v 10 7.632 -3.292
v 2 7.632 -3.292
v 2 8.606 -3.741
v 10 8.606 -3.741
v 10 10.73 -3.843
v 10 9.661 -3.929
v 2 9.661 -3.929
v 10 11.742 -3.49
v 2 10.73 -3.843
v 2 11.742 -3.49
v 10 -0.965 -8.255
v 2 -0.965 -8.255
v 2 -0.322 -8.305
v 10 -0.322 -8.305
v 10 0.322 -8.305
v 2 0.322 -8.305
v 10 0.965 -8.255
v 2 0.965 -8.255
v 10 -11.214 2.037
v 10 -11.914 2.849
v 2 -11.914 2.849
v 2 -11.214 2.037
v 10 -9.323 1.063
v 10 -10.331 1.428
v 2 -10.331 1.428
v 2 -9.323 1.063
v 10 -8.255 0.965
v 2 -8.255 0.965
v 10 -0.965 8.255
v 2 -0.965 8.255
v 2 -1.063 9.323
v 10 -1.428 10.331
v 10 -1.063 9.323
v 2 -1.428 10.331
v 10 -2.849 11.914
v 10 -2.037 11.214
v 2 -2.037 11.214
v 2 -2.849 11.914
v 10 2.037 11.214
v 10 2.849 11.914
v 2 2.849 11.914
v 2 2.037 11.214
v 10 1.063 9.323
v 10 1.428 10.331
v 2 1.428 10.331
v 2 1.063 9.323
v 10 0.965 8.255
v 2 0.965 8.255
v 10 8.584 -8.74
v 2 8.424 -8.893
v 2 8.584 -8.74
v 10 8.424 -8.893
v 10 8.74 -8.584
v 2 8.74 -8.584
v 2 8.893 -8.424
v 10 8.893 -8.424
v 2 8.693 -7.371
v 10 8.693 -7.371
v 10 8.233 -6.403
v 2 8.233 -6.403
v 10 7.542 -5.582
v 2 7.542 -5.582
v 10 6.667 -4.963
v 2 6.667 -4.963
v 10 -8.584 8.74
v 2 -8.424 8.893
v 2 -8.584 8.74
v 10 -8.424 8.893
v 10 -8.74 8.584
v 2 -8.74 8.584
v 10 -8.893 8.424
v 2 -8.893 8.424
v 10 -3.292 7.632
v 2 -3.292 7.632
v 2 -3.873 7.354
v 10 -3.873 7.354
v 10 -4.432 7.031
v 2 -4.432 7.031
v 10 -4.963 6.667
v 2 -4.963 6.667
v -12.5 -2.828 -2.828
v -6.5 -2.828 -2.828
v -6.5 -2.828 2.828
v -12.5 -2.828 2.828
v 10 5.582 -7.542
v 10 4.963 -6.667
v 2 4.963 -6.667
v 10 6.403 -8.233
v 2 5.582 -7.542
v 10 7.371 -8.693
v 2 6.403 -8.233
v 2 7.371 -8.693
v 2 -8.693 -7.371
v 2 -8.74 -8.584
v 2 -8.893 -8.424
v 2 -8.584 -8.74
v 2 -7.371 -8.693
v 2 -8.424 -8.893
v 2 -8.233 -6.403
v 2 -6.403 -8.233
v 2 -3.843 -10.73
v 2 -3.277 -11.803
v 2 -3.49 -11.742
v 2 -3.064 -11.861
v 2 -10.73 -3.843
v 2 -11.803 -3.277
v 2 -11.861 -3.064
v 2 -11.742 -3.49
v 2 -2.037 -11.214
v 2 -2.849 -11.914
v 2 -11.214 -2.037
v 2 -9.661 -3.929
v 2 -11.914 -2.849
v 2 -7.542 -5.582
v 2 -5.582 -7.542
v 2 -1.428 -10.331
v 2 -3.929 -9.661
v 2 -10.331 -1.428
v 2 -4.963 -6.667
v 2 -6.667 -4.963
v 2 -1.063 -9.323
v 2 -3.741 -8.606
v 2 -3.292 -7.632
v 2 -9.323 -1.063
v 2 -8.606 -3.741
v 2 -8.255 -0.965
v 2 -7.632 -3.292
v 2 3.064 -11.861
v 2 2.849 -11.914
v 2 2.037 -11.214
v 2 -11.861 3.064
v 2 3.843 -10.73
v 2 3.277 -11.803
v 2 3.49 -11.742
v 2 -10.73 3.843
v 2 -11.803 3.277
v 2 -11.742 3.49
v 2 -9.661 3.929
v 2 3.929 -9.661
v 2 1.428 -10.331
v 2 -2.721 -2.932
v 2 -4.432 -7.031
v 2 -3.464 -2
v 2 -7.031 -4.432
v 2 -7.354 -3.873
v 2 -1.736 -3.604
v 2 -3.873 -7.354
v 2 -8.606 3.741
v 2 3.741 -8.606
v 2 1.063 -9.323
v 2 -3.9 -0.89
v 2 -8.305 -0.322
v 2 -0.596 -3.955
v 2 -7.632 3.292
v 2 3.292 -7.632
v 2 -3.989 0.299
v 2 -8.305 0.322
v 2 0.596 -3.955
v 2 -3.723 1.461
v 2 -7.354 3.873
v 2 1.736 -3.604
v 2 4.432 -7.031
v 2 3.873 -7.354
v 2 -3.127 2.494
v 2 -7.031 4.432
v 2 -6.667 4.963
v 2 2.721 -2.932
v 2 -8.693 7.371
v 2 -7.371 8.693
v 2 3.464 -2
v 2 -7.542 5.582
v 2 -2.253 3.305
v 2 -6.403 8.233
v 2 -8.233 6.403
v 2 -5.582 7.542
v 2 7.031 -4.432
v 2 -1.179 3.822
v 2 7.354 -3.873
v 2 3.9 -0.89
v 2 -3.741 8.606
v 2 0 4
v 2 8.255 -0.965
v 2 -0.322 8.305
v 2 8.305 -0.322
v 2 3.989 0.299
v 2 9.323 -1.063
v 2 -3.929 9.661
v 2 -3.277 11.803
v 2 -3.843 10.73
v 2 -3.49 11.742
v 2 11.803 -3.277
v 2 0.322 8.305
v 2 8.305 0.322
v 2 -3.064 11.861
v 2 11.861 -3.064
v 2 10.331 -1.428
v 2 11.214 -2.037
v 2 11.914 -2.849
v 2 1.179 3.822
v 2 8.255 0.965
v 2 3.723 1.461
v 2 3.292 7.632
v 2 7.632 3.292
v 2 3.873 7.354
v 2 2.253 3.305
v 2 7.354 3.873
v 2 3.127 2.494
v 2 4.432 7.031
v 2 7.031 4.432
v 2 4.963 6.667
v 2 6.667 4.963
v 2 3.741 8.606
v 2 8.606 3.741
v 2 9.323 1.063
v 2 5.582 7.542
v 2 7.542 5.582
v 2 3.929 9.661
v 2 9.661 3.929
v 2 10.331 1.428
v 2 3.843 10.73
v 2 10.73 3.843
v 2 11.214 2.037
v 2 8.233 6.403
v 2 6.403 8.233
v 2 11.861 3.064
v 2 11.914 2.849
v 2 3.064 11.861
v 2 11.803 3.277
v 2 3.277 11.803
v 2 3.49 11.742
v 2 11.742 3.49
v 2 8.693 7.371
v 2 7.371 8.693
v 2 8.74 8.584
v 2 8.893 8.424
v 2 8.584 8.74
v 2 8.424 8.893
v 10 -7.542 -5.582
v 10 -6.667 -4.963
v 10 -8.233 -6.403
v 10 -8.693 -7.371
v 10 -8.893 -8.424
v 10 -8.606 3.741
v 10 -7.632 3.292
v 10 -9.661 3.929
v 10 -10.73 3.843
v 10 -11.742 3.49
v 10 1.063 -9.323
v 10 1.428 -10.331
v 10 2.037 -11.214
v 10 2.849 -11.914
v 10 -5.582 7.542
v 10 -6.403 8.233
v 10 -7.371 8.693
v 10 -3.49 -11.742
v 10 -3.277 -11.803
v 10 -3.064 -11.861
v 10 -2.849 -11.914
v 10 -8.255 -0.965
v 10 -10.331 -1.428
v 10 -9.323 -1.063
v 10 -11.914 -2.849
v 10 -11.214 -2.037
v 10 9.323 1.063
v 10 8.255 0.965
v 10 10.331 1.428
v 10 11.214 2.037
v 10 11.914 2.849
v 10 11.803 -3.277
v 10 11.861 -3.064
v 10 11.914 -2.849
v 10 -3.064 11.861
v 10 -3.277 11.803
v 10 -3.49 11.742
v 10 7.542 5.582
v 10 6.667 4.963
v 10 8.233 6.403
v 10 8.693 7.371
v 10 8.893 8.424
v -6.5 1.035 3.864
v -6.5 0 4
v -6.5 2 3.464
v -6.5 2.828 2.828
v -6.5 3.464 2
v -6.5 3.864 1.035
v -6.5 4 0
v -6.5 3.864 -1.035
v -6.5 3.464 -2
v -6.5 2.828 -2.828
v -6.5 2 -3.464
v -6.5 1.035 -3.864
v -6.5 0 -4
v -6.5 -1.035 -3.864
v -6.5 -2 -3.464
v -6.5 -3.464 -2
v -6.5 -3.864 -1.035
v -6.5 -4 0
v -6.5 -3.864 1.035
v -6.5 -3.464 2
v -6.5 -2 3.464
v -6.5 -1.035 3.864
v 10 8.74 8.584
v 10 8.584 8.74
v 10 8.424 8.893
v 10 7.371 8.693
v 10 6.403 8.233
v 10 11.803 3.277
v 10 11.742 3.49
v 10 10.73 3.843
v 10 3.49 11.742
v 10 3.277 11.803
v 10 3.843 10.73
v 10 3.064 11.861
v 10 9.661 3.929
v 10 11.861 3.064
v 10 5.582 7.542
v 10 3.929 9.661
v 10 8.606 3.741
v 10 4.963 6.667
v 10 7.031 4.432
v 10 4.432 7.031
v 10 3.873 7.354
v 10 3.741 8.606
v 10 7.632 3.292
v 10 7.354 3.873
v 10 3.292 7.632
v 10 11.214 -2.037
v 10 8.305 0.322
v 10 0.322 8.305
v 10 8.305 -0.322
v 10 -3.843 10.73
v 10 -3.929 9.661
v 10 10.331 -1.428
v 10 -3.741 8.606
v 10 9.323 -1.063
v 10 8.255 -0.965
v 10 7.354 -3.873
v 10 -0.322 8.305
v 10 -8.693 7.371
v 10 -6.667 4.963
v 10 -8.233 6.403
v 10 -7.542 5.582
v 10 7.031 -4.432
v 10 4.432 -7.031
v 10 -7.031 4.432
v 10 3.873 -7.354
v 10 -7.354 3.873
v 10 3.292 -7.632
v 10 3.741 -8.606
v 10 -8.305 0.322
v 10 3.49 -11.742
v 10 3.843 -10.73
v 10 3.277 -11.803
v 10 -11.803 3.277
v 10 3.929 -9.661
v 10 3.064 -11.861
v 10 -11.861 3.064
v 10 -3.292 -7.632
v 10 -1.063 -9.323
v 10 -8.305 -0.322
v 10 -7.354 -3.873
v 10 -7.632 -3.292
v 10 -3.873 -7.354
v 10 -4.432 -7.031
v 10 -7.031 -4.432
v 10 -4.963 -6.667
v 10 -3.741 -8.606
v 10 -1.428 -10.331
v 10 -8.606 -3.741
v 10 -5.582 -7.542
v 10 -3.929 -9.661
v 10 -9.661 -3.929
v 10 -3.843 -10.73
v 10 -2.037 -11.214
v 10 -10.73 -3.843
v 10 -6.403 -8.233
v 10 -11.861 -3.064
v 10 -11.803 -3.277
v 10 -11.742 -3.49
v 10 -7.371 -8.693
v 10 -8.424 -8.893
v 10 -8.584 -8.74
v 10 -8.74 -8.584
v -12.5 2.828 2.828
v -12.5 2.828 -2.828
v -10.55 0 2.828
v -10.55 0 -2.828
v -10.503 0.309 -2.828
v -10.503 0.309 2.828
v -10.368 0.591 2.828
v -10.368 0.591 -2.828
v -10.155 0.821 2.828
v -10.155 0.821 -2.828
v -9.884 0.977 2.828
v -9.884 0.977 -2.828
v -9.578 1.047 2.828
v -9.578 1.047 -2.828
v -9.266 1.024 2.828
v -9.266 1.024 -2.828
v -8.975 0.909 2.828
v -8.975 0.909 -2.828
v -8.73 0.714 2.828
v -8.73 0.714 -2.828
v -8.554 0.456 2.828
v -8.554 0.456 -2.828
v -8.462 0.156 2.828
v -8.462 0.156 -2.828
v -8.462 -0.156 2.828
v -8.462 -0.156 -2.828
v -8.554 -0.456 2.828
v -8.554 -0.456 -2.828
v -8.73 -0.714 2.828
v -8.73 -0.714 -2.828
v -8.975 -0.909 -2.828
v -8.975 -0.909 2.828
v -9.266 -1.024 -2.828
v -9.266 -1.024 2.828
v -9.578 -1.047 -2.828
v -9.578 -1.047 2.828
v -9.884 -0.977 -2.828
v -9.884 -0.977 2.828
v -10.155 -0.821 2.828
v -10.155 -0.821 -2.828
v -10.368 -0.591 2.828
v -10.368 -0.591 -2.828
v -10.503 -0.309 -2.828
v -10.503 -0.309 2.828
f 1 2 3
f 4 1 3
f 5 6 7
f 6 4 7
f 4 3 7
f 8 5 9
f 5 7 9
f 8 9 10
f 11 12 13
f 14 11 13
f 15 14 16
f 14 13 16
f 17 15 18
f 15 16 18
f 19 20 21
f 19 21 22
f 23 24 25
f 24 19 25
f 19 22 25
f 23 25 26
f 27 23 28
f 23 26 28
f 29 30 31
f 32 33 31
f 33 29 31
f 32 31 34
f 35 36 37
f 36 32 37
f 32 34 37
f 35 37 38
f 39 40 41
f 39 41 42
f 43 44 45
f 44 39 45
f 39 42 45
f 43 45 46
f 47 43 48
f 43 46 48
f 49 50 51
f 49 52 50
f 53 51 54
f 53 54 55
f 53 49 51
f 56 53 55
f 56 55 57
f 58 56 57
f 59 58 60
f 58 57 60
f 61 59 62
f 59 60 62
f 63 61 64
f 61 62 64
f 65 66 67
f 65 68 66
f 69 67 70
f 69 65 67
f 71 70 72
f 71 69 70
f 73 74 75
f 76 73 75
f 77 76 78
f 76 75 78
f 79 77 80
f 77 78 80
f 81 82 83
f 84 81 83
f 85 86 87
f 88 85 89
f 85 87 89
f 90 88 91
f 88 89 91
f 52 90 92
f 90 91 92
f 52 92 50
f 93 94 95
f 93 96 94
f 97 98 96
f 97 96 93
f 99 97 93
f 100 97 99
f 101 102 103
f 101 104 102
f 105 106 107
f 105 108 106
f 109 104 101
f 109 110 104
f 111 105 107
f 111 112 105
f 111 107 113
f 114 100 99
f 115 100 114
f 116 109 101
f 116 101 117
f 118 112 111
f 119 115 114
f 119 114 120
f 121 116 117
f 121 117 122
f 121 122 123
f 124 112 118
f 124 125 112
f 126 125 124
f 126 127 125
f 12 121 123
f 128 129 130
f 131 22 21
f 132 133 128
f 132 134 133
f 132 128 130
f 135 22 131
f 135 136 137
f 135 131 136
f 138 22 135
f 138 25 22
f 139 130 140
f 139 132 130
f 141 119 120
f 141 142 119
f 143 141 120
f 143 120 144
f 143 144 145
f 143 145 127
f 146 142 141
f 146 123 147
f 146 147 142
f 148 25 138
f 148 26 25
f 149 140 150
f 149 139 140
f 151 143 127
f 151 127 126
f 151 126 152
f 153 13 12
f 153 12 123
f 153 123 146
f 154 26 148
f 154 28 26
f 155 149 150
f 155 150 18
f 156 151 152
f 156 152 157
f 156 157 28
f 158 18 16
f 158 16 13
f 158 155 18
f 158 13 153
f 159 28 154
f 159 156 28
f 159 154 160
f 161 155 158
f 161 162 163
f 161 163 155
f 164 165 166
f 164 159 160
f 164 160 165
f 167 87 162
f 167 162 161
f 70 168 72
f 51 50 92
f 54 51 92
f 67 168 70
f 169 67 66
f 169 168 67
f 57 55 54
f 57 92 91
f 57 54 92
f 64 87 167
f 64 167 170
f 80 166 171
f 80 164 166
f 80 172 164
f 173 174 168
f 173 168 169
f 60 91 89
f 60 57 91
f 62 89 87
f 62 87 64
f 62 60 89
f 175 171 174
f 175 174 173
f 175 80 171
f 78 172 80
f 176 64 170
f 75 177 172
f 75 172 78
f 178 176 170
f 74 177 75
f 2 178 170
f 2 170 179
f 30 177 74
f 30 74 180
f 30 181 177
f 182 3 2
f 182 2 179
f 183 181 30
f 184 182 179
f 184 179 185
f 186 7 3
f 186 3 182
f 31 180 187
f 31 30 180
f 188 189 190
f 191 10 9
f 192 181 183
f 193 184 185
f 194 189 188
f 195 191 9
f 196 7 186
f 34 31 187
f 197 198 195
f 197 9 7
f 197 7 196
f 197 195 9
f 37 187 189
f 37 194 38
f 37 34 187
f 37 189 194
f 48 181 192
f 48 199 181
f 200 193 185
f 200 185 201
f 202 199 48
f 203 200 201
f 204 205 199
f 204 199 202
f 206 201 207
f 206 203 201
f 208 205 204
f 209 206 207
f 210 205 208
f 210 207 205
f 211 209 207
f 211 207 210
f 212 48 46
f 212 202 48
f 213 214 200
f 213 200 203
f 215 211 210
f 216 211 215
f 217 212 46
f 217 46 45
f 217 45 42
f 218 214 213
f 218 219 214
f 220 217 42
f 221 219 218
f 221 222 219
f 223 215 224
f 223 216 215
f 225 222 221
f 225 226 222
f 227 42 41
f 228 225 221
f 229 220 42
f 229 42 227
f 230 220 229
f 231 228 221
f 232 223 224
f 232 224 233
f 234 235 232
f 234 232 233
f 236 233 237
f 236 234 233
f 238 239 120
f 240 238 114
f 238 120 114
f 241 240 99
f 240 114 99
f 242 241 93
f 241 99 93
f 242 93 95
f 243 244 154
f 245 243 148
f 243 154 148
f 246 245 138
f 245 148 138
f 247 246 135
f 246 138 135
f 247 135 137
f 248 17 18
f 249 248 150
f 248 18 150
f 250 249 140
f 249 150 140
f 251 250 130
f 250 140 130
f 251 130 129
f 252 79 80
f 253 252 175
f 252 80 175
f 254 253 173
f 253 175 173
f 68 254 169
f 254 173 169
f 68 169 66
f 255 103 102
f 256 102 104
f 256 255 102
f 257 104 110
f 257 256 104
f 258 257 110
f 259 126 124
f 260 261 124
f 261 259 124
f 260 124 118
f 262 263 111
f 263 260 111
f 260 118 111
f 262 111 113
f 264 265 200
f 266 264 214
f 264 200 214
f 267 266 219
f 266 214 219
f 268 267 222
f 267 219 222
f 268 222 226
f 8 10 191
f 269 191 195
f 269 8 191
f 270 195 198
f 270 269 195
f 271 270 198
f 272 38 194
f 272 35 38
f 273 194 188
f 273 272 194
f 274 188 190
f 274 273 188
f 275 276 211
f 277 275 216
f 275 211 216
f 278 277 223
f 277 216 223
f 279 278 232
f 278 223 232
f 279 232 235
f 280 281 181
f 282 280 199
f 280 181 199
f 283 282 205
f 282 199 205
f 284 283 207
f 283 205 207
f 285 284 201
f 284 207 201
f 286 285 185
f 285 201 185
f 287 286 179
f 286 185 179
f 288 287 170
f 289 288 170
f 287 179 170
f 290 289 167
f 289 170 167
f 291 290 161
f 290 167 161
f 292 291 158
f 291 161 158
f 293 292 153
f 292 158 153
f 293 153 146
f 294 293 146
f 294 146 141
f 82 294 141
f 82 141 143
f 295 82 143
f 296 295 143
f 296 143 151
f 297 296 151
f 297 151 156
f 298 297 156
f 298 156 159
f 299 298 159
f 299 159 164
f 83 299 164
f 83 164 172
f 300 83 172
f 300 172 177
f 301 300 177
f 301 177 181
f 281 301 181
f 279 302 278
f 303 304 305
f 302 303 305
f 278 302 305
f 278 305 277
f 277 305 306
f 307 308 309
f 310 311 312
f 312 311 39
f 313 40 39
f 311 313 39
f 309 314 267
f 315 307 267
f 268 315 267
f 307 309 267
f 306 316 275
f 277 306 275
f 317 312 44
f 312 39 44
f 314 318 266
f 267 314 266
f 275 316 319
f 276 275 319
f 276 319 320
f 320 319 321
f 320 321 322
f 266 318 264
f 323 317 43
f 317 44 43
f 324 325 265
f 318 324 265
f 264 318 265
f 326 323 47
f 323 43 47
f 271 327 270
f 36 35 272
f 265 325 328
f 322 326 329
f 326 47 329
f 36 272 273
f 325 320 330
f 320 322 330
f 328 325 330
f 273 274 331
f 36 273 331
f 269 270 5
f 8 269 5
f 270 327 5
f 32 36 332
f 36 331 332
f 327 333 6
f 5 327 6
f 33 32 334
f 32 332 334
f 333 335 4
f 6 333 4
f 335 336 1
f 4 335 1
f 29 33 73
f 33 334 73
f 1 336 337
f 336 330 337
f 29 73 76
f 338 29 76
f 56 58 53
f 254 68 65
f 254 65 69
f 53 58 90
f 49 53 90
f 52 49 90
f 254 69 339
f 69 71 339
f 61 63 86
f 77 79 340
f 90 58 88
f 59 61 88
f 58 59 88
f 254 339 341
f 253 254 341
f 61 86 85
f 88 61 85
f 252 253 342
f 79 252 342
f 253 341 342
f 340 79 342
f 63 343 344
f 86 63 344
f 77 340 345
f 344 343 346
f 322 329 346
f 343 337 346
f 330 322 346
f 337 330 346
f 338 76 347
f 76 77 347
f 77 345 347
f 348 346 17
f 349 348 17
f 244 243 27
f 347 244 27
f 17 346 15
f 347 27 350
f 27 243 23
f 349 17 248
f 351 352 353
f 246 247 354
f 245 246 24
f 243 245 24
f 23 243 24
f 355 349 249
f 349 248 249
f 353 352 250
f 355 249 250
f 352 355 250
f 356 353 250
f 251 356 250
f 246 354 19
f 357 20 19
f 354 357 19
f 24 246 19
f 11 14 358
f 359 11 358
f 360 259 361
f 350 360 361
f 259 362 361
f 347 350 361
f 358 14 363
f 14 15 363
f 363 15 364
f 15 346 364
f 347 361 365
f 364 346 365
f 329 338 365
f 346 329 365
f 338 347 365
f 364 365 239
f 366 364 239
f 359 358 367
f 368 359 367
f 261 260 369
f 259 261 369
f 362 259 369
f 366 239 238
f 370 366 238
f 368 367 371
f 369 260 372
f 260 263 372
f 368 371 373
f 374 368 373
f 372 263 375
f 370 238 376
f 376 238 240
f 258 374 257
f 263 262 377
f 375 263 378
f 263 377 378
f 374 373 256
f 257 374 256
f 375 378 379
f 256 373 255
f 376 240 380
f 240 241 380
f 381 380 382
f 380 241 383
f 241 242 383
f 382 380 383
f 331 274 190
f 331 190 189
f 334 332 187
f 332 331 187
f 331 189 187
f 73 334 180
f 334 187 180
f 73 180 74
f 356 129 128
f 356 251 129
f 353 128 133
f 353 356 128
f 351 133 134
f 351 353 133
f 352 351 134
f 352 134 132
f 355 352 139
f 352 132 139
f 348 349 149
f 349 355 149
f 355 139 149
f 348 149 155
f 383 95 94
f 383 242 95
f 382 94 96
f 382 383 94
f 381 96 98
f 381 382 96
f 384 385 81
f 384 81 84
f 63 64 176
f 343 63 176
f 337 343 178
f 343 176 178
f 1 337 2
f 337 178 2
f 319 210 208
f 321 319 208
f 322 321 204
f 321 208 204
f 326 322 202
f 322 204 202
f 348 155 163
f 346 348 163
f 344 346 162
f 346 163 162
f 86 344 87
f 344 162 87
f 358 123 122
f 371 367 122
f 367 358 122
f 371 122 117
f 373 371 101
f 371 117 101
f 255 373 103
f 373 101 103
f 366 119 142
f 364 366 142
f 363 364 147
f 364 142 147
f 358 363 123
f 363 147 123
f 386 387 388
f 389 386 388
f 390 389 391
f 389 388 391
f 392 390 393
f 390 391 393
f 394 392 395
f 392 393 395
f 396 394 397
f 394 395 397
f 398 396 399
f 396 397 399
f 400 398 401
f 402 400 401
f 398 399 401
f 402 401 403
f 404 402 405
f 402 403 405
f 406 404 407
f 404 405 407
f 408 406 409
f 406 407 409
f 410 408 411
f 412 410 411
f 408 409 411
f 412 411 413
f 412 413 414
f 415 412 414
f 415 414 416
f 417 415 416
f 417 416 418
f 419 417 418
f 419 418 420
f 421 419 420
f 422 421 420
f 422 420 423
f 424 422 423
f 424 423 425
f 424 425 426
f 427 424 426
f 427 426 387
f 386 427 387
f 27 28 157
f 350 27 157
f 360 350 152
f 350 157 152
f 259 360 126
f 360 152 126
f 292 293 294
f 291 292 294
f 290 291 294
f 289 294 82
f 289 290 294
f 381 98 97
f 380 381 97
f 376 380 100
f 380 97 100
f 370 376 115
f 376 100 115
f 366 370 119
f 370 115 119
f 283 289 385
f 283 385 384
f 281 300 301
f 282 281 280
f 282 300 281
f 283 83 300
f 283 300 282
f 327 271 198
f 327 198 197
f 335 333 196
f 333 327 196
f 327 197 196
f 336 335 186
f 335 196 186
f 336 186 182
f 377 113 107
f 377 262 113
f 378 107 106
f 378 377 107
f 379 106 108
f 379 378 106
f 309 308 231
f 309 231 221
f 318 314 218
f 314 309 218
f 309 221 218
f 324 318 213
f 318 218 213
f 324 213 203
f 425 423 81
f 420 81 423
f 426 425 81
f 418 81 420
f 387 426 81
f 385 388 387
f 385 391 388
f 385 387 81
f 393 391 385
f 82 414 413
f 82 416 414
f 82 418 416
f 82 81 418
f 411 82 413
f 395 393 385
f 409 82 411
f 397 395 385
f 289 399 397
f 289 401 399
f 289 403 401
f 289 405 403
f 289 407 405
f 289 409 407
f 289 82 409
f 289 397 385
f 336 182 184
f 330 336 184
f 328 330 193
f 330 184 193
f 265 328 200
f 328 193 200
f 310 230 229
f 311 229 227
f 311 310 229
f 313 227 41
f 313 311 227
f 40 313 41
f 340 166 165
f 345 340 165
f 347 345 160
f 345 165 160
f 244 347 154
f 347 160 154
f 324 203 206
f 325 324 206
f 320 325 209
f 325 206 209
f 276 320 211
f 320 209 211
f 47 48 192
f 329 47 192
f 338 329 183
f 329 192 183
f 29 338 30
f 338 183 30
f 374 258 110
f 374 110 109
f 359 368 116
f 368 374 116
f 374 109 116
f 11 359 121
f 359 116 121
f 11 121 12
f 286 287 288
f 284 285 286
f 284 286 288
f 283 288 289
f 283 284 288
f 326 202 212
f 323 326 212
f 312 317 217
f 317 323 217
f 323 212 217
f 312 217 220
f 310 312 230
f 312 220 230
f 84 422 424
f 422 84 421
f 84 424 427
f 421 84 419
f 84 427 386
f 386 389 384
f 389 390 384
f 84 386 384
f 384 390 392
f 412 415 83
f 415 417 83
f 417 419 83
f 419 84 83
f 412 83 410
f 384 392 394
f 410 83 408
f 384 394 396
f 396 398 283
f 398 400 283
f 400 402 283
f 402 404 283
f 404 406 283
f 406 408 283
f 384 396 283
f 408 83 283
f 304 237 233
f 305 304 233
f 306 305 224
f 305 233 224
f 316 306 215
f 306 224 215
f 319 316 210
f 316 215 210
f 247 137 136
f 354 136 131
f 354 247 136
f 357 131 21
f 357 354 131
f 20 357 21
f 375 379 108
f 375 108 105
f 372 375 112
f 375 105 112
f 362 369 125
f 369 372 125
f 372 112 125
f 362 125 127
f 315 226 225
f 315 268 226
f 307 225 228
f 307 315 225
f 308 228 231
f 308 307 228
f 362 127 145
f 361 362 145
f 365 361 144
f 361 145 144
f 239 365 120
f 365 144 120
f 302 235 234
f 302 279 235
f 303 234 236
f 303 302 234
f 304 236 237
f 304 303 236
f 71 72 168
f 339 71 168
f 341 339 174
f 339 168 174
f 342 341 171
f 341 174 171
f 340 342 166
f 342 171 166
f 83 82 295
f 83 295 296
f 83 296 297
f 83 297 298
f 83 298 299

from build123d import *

# Parameters (mm, degrees)
BASPROSKE_W             = 10
BASPROSKE_H             = 12.25
TOOTHCUT_DEPTH          = 21.003124756
TEETHCUTS_COUNT         = 12
TEETHCUTS_ANGLE         = 330
BORSKE_R                = 4.5
BORE_DEPTH              = 50.0000508
ESQUISSE4_R             = 16.84973796
ENL_V_MAT_EXTRU_2_DEPTH = 2
ESQUISSE5_R             = 5.070841349
BOSS_EXTRU_7_DEPTH      = 8
ESQUISSE6_R             = 4
BOSS_EXTRU_8_DEPTH      = 8.5
ESQUISSE7_W             = 5.65685425
ESQUISSE7_H             = 5.65685425
BOSS_EXTRU_9_DEPTH      = 6
ESQUISSE8_R             = 1.05
ENL_V_MAT_EXTRU_3_DEPTH = 6


with BuildPart() as part:
    # BasProSke → Base-Revolve (revolve)
    with BuildSketch(Plane(origin=(0, 0, 0), x_dir=(1, 0, 0), z_dir=(0, 1, 0)), mode=Mode.PRIVATE) as base_revolve_sk:
        with Locations((5, 6.125)):
            Rectangle(BASPROSKE_W, BASPROSKE_H)
    revolve(base_revolve_sk.sketch.rotate(Axis((-10, 0, 0), (1, 0, 0)), 180), axis=Axis((-10, 0, 0), (1, 0, 0)))

    # TooCutSke → ToothCut (cut, through all)
    with BuildSketch(Plane(origin=(0, 0, 0), x_dir=(0, 0, -1), z_dir=(1, 0, 0))):
        with BuildLine():
            ThreePointArc((0.965128363, 8.255274647), (0, 8.3115), (-0.965128363, 8.255274647))
            ThreePointArc((-0.965128363, 8.255274647), (-1.43628674, 10.346733197), (-2.878284339, 11.933185846))
            ThreePointArc((-2.878284339, 11.933185846), (0, 12.2754), (2.878284339, 11.933185846))
            ThreePointArc((2.878284339, 11.933185846), (1.43628674, 10.346733197), (0.965128363, 8.255274647))
        make_face()
    toothcut = extrude(amount=TOOTHCUT_DEPTH, mode=Mode.SUBTRACT)

    # TeethCuts: ToothCut ×12 about axis
    teethcuts_axis = Axis((-10, 0, 0), (1, 0, 0))
    for i in range(1, TEETHCUTS_COUNT):
        add(toothcut.rotate(teethcuts_axis, i * TEETHCUTS_ANGLE / (TEETHCUTS_COUNT - 1)), mode=Mode.SUBTRACT)

    # BorSke → Bore (cut, symmetric)
    with BuildSketch(Plane(origin=(0, 0, 0), x_dir=(0, 0, -1), z_dir=(1, 0, 0))):
        with Locations(Location((0, 0, 0), (0, 0, 180))):
            Circle(BORSKE_R)
    extrude(amount=BORE_DEPTH, both=True, mode=Mode.SUBTRACT)

    # Esquisse4 → Enlèv. mat.-Extru.2 (cut)
    with BuildSketch(Plane.ZY):
        Circle(ESQUISSE4_R)
    extrude(amount=-ENL_V_MAT_EXTRU_2_DEPTH, mode=Mode.SUBTRACT)

    # Esquisse5 → Boss.-Extru.7 (add)
    with BuildSketch(Plane.ZY.offset(-2)):
        Circle(ESQUISSE5_R)
    extrude(amount=-BOSS_EXTRU_7_DEPTH)

    # Esquisse6 → Boss.-Extru.8 (add)
    with BuildSketch(Plane.ZY.offset(-2)):
        Circle(ESQUISSE6_R)
    extrude(amount=BOSS_EXTRU_8_DEPTH)

    # Esquisse7 → Boss.-Extru.9 (add)
    with BuildSketch(Plane.ZY.offset(6.5)):
        Rectangle(ESQUISSE7_W, ESQUISSE7_H)
    extrude(amount=BOSS_EXTRU_9_DEPTH)

    # Esquisse8 → Enlèv. mat.-Extru.3 (cut)
    with BuildSketch(Plane(origin=(0, 0, -2.828427125), x_dir=(-1, 0, 0), z_dir=(0, 0, -1))):
        with Locations((9.5, 0)):
            Circle(ESQUISSE8_R)
    extrude(amount=-ENL_V_MAT_EXTRU_3_DEPTH, mode=Mode.SUBTRACT)


solid = part.part
